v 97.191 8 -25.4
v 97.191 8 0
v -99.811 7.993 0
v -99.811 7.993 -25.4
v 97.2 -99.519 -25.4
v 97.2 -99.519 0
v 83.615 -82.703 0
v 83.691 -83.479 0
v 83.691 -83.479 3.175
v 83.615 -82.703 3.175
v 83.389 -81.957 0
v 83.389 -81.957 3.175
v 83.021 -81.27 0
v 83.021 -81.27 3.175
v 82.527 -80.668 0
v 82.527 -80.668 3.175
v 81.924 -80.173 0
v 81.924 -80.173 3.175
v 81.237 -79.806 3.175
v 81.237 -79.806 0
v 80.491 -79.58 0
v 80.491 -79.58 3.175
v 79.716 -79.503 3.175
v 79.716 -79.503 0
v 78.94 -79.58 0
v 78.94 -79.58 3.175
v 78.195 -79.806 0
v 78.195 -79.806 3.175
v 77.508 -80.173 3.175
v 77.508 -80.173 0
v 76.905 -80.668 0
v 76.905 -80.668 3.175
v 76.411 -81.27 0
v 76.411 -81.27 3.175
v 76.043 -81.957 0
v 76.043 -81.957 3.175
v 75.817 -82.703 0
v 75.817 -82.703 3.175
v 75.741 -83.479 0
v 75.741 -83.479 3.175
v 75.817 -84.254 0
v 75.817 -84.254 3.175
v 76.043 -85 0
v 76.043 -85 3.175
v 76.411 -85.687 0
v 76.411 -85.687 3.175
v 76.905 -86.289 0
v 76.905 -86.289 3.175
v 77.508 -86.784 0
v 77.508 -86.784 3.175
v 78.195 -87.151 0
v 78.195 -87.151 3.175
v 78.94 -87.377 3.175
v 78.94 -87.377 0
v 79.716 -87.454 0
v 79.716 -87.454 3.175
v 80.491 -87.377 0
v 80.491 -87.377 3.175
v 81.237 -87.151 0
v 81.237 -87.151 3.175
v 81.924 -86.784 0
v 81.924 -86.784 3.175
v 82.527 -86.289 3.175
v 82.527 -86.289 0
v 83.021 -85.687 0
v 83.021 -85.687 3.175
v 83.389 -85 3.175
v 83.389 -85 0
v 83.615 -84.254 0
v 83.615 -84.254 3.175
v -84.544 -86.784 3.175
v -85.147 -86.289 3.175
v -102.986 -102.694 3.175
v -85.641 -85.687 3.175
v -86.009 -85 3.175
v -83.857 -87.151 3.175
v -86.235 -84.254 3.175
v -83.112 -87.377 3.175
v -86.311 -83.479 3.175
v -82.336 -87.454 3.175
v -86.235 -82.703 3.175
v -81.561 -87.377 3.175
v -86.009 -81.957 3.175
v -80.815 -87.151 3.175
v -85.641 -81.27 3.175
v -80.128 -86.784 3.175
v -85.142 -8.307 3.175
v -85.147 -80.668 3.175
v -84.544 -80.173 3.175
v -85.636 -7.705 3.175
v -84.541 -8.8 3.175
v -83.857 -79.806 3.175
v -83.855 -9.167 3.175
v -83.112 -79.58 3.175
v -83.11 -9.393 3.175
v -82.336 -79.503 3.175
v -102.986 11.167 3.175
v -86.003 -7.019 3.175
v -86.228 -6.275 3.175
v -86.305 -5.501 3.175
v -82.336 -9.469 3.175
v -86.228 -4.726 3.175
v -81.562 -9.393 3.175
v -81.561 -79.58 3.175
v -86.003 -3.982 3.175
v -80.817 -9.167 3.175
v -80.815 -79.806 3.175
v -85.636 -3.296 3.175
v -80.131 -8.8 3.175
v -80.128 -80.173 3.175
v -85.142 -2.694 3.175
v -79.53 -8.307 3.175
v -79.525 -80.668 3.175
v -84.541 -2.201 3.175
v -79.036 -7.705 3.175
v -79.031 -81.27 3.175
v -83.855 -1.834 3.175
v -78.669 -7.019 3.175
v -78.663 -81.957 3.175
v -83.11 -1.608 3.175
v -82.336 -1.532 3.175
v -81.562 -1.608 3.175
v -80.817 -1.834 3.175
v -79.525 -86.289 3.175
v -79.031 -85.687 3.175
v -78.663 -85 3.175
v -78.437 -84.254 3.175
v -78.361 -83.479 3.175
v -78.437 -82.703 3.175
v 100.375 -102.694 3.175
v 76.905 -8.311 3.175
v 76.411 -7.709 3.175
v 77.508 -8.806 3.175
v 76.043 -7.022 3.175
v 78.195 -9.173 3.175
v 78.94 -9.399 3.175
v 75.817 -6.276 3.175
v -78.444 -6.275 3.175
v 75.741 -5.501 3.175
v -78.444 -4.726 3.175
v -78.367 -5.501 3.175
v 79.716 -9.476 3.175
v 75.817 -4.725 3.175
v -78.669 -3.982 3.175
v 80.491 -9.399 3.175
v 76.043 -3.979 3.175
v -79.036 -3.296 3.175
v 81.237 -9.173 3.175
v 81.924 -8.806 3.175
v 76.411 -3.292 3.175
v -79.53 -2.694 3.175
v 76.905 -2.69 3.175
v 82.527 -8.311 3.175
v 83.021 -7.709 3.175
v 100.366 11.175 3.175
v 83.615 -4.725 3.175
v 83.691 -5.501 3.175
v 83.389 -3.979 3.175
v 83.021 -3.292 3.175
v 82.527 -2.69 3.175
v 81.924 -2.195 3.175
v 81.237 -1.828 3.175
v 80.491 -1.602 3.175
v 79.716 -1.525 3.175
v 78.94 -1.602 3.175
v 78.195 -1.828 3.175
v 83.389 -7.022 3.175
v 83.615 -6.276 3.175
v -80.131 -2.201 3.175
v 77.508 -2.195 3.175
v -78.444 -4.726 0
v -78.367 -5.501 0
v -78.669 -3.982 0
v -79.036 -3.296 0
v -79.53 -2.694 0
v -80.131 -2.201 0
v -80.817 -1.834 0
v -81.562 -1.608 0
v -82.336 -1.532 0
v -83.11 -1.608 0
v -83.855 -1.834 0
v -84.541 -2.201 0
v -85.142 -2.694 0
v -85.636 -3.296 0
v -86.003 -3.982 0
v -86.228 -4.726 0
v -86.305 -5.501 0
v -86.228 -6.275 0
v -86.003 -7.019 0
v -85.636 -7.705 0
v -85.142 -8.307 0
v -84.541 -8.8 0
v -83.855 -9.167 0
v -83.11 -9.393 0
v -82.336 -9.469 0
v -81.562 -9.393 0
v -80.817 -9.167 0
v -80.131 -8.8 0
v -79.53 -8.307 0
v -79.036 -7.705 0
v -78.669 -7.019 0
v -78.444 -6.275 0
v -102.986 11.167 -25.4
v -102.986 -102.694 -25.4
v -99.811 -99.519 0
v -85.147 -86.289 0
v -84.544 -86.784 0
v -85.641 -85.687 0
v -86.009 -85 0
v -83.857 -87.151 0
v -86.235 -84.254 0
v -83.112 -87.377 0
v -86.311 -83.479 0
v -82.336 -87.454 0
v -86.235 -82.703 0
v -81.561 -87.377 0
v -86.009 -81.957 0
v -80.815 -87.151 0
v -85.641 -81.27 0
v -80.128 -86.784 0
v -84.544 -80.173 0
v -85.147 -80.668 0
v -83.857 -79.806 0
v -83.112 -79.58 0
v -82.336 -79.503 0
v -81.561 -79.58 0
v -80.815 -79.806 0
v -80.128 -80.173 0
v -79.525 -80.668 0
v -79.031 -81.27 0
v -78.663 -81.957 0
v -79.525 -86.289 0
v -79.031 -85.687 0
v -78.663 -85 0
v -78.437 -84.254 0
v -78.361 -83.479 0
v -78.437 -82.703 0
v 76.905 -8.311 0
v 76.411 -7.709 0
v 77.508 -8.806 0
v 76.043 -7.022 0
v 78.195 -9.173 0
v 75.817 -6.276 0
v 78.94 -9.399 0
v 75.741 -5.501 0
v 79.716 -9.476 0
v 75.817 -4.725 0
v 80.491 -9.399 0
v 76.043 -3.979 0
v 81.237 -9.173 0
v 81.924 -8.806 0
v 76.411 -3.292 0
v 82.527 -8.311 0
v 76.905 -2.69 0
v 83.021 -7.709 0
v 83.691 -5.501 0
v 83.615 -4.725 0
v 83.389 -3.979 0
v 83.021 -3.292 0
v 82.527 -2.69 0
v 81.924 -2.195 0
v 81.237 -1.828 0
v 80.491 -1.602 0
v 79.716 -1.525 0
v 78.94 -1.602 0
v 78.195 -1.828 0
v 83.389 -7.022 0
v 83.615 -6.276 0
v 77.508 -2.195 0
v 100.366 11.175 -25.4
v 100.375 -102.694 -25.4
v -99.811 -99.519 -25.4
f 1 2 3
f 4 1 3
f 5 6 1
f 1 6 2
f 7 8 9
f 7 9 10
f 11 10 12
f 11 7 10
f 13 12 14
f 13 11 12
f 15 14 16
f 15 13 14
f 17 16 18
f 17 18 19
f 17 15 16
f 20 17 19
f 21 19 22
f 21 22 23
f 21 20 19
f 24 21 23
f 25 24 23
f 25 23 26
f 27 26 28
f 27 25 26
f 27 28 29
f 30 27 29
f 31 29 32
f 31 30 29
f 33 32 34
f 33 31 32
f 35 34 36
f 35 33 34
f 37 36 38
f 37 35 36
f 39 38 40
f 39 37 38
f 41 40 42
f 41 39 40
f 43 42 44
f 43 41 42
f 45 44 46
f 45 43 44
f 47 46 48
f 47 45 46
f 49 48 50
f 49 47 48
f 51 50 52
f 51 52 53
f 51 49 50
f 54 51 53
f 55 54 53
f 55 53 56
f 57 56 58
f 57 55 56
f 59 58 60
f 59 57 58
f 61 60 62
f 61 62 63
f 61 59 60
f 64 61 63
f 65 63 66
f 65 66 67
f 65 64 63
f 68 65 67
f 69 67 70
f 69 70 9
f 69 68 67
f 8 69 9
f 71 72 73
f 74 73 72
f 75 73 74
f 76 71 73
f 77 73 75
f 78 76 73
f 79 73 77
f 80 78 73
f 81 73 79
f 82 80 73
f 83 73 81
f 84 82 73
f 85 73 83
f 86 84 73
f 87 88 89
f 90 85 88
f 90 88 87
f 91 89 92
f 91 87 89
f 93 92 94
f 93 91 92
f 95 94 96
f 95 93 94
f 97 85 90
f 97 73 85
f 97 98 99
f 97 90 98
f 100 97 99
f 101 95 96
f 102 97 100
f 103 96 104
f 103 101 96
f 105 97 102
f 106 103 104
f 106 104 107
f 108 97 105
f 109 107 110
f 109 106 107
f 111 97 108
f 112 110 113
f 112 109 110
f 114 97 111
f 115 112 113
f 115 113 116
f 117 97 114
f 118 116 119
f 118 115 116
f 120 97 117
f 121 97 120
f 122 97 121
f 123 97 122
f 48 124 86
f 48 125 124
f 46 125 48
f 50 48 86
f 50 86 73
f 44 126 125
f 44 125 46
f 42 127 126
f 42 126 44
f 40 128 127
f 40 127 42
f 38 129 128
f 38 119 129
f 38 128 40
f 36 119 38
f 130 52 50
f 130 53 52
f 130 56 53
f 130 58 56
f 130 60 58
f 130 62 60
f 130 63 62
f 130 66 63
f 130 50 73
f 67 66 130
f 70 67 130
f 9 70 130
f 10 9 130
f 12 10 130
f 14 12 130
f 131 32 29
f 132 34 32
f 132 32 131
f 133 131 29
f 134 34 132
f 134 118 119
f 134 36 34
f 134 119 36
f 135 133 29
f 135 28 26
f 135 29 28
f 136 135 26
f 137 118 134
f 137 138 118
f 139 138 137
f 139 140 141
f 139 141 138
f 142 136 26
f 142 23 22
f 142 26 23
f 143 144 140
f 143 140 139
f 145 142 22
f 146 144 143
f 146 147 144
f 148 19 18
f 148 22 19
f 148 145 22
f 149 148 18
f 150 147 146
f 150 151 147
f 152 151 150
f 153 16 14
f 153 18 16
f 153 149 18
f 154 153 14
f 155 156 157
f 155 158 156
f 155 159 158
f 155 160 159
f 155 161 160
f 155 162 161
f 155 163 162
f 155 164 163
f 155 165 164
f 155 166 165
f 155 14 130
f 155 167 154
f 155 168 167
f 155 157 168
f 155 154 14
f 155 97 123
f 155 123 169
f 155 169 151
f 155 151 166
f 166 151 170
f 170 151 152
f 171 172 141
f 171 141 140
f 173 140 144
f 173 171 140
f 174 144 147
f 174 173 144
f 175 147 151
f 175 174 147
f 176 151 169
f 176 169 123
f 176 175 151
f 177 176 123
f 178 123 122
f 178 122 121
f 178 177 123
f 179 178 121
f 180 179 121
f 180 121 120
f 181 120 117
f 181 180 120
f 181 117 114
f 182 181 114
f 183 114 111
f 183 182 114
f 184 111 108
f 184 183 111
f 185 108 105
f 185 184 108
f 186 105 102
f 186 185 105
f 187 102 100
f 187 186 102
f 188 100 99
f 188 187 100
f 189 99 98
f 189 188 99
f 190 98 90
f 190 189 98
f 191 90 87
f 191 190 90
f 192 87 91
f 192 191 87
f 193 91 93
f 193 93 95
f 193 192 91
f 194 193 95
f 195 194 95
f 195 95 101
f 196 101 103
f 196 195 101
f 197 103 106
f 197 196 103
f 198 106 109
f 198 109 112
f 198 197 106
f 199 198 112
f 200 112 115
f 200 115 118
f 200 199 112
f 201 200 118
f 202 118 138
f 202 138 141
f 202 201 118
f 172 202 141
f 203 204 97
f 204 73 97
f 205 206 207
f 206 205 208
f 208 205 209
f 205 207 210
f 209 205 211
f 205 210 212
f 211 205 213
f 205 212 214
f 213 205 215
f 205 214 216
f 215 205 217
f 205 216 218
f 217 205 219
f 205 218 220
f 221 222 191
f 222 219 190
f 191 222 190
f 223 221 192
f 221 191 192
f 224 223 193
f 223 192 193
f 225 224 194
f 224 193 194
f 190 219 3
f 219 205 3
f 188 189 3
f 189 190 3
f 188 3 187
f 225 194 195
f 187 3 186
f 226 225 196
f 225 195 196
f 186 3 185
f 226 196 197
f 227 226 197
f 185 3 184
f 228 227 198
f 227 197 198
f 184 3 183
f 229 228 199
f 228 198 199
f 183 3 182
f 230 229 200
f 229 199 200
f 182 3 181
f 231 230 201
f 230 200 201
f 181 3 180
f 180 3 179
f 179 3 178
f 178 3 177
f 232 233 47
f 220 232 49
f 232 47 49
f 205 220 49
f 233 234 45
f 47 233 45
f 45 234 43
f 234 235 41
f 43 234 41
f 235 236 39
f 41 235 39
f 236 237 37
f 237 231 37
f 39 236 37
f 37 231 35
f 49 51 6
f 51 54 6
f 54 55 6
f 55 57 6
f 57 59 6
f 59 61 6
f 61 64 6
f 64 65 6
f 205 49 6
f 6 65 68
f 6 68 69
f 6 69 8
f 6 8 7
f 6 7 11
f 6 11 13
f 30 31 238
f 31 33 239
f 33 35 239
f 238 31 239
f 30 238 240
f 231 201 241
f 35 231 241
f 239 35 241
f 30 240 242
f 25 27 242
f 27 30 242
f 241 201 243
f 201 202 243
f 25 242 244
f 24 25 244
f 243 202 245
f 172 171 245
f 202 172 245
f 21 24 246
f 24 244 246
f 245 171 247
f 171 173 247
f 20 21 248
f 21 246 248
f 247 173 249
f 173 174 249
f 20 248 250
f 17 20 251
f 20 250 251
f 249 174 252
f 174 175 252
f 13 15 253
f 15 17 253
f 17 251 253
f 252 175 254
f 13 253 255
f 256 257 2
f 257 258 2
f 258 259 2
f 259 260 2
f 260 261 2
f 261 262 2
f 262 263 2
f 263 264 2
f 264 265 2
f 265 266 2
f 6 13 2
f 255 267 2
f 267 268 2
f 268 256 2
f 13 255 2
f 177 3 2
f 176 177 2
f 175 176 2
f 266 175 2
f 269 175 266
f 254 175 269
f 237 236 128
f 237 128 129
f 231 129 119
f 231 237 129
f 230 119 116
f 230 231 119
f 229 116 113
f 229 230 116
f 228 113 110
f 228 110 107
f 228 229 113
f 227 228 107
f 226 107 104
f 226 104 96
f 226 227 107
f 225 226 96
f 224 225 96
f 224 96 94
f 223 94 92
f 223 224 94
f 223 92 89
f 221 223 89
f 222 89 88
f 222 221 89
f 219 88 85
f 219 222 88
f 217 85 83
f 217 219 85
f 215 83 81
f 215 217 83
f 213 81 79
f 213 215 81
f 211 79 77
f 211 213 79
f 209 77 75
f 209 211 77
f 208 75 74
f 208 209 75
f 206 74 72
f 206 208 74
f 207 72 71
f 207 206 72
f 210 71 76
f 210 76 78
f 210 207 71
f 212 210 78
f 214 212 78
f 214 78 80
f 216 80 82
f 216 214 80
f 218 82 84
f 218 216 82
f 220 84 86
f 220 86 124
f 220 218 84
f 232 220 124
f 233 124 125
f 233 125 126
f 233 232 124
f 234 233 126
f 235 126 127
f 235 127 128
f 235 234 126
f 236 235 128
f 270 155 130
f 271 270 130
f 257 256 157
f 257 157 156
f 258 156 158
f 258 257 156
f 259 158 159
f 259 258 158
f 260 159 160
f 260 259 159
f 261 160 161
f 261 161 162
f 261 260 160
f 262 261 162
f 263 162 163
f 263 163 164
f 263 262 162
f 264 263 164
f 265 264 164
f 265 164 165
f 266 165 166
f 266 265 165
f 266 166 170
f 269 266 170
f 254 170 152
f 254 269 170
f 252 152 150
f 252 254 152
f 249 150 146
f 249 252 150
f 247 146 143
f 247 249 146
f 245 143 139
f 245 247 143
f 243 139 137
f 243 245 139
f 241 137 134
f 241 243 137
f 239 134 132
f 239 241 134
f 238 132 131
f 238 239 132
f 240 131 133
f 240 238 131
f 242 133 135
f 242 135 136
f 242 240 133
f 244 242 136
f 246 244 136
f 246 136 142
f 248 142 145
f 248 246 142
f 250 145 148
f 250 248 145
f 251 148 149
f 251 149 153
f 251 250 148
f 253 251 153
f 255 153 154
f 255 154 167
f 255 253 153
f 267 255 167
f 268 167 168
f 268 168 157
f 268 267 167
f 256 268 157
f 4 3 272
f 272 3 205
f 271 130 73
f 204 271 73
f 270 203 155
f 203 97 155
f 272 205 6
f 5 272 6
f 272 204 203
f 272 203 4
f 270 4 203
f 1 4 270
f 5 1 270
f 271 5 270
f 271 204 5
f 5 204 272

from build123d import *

# Parameters (mm, degrees)
F0_R     = 3.9751
F0_R_2   = 3.96875
F1_DEPTH = 3.175
F3_DEPTH = 25.4


with BuildPart() as f1:
    # F0 (on Top) → F1 (new body)
    with BuildSketch(Plane.XY):
        Polygon((-102.986208, 11.167409), (-102.986208, -102.693632), (100.37496, -102.693632), (100.366036, 11.175378), align=None)
        with Locations((-82.336008, -83.478532)):
            Circle(F0_R, mode=Mode.SUBTRACT)
        with Locations((79.715992, -83.478532)):
            Circle(F0_R, mode=Mode.SUBTRACT)
        with Locations((-82.336008, -5.500532)):
            Circle(F0_R_2, mode=Mode.SUBTRACT)
        with Locations((79.715992, -5.500532)):
            Circle(F0_R, mode=Mode.SUBTRACT)
    extrude(amount=F1_DEPTH)

    # F2 (on face) → F3 (join)
    with BuildSketch(Plane(origin=(0, 0, 0), x_dir=(1, 0, 0), z_dir=(0, 0, -1))):
        Polygon((100.37496, 102.693632), (-102.986208, 102.693632), (-102.986208, -11.167409), (100.366036, -11.175378), align=None)
        Polygon((-99.811208, -7.992534), (-99.811208, 99.518632), (97.199711, 99.518632), (97.191285, -8.000253), align=None, mode=Mode.SUBTRACT)
    extrude(amount=F3_DEPTH)


solid = f1.part
